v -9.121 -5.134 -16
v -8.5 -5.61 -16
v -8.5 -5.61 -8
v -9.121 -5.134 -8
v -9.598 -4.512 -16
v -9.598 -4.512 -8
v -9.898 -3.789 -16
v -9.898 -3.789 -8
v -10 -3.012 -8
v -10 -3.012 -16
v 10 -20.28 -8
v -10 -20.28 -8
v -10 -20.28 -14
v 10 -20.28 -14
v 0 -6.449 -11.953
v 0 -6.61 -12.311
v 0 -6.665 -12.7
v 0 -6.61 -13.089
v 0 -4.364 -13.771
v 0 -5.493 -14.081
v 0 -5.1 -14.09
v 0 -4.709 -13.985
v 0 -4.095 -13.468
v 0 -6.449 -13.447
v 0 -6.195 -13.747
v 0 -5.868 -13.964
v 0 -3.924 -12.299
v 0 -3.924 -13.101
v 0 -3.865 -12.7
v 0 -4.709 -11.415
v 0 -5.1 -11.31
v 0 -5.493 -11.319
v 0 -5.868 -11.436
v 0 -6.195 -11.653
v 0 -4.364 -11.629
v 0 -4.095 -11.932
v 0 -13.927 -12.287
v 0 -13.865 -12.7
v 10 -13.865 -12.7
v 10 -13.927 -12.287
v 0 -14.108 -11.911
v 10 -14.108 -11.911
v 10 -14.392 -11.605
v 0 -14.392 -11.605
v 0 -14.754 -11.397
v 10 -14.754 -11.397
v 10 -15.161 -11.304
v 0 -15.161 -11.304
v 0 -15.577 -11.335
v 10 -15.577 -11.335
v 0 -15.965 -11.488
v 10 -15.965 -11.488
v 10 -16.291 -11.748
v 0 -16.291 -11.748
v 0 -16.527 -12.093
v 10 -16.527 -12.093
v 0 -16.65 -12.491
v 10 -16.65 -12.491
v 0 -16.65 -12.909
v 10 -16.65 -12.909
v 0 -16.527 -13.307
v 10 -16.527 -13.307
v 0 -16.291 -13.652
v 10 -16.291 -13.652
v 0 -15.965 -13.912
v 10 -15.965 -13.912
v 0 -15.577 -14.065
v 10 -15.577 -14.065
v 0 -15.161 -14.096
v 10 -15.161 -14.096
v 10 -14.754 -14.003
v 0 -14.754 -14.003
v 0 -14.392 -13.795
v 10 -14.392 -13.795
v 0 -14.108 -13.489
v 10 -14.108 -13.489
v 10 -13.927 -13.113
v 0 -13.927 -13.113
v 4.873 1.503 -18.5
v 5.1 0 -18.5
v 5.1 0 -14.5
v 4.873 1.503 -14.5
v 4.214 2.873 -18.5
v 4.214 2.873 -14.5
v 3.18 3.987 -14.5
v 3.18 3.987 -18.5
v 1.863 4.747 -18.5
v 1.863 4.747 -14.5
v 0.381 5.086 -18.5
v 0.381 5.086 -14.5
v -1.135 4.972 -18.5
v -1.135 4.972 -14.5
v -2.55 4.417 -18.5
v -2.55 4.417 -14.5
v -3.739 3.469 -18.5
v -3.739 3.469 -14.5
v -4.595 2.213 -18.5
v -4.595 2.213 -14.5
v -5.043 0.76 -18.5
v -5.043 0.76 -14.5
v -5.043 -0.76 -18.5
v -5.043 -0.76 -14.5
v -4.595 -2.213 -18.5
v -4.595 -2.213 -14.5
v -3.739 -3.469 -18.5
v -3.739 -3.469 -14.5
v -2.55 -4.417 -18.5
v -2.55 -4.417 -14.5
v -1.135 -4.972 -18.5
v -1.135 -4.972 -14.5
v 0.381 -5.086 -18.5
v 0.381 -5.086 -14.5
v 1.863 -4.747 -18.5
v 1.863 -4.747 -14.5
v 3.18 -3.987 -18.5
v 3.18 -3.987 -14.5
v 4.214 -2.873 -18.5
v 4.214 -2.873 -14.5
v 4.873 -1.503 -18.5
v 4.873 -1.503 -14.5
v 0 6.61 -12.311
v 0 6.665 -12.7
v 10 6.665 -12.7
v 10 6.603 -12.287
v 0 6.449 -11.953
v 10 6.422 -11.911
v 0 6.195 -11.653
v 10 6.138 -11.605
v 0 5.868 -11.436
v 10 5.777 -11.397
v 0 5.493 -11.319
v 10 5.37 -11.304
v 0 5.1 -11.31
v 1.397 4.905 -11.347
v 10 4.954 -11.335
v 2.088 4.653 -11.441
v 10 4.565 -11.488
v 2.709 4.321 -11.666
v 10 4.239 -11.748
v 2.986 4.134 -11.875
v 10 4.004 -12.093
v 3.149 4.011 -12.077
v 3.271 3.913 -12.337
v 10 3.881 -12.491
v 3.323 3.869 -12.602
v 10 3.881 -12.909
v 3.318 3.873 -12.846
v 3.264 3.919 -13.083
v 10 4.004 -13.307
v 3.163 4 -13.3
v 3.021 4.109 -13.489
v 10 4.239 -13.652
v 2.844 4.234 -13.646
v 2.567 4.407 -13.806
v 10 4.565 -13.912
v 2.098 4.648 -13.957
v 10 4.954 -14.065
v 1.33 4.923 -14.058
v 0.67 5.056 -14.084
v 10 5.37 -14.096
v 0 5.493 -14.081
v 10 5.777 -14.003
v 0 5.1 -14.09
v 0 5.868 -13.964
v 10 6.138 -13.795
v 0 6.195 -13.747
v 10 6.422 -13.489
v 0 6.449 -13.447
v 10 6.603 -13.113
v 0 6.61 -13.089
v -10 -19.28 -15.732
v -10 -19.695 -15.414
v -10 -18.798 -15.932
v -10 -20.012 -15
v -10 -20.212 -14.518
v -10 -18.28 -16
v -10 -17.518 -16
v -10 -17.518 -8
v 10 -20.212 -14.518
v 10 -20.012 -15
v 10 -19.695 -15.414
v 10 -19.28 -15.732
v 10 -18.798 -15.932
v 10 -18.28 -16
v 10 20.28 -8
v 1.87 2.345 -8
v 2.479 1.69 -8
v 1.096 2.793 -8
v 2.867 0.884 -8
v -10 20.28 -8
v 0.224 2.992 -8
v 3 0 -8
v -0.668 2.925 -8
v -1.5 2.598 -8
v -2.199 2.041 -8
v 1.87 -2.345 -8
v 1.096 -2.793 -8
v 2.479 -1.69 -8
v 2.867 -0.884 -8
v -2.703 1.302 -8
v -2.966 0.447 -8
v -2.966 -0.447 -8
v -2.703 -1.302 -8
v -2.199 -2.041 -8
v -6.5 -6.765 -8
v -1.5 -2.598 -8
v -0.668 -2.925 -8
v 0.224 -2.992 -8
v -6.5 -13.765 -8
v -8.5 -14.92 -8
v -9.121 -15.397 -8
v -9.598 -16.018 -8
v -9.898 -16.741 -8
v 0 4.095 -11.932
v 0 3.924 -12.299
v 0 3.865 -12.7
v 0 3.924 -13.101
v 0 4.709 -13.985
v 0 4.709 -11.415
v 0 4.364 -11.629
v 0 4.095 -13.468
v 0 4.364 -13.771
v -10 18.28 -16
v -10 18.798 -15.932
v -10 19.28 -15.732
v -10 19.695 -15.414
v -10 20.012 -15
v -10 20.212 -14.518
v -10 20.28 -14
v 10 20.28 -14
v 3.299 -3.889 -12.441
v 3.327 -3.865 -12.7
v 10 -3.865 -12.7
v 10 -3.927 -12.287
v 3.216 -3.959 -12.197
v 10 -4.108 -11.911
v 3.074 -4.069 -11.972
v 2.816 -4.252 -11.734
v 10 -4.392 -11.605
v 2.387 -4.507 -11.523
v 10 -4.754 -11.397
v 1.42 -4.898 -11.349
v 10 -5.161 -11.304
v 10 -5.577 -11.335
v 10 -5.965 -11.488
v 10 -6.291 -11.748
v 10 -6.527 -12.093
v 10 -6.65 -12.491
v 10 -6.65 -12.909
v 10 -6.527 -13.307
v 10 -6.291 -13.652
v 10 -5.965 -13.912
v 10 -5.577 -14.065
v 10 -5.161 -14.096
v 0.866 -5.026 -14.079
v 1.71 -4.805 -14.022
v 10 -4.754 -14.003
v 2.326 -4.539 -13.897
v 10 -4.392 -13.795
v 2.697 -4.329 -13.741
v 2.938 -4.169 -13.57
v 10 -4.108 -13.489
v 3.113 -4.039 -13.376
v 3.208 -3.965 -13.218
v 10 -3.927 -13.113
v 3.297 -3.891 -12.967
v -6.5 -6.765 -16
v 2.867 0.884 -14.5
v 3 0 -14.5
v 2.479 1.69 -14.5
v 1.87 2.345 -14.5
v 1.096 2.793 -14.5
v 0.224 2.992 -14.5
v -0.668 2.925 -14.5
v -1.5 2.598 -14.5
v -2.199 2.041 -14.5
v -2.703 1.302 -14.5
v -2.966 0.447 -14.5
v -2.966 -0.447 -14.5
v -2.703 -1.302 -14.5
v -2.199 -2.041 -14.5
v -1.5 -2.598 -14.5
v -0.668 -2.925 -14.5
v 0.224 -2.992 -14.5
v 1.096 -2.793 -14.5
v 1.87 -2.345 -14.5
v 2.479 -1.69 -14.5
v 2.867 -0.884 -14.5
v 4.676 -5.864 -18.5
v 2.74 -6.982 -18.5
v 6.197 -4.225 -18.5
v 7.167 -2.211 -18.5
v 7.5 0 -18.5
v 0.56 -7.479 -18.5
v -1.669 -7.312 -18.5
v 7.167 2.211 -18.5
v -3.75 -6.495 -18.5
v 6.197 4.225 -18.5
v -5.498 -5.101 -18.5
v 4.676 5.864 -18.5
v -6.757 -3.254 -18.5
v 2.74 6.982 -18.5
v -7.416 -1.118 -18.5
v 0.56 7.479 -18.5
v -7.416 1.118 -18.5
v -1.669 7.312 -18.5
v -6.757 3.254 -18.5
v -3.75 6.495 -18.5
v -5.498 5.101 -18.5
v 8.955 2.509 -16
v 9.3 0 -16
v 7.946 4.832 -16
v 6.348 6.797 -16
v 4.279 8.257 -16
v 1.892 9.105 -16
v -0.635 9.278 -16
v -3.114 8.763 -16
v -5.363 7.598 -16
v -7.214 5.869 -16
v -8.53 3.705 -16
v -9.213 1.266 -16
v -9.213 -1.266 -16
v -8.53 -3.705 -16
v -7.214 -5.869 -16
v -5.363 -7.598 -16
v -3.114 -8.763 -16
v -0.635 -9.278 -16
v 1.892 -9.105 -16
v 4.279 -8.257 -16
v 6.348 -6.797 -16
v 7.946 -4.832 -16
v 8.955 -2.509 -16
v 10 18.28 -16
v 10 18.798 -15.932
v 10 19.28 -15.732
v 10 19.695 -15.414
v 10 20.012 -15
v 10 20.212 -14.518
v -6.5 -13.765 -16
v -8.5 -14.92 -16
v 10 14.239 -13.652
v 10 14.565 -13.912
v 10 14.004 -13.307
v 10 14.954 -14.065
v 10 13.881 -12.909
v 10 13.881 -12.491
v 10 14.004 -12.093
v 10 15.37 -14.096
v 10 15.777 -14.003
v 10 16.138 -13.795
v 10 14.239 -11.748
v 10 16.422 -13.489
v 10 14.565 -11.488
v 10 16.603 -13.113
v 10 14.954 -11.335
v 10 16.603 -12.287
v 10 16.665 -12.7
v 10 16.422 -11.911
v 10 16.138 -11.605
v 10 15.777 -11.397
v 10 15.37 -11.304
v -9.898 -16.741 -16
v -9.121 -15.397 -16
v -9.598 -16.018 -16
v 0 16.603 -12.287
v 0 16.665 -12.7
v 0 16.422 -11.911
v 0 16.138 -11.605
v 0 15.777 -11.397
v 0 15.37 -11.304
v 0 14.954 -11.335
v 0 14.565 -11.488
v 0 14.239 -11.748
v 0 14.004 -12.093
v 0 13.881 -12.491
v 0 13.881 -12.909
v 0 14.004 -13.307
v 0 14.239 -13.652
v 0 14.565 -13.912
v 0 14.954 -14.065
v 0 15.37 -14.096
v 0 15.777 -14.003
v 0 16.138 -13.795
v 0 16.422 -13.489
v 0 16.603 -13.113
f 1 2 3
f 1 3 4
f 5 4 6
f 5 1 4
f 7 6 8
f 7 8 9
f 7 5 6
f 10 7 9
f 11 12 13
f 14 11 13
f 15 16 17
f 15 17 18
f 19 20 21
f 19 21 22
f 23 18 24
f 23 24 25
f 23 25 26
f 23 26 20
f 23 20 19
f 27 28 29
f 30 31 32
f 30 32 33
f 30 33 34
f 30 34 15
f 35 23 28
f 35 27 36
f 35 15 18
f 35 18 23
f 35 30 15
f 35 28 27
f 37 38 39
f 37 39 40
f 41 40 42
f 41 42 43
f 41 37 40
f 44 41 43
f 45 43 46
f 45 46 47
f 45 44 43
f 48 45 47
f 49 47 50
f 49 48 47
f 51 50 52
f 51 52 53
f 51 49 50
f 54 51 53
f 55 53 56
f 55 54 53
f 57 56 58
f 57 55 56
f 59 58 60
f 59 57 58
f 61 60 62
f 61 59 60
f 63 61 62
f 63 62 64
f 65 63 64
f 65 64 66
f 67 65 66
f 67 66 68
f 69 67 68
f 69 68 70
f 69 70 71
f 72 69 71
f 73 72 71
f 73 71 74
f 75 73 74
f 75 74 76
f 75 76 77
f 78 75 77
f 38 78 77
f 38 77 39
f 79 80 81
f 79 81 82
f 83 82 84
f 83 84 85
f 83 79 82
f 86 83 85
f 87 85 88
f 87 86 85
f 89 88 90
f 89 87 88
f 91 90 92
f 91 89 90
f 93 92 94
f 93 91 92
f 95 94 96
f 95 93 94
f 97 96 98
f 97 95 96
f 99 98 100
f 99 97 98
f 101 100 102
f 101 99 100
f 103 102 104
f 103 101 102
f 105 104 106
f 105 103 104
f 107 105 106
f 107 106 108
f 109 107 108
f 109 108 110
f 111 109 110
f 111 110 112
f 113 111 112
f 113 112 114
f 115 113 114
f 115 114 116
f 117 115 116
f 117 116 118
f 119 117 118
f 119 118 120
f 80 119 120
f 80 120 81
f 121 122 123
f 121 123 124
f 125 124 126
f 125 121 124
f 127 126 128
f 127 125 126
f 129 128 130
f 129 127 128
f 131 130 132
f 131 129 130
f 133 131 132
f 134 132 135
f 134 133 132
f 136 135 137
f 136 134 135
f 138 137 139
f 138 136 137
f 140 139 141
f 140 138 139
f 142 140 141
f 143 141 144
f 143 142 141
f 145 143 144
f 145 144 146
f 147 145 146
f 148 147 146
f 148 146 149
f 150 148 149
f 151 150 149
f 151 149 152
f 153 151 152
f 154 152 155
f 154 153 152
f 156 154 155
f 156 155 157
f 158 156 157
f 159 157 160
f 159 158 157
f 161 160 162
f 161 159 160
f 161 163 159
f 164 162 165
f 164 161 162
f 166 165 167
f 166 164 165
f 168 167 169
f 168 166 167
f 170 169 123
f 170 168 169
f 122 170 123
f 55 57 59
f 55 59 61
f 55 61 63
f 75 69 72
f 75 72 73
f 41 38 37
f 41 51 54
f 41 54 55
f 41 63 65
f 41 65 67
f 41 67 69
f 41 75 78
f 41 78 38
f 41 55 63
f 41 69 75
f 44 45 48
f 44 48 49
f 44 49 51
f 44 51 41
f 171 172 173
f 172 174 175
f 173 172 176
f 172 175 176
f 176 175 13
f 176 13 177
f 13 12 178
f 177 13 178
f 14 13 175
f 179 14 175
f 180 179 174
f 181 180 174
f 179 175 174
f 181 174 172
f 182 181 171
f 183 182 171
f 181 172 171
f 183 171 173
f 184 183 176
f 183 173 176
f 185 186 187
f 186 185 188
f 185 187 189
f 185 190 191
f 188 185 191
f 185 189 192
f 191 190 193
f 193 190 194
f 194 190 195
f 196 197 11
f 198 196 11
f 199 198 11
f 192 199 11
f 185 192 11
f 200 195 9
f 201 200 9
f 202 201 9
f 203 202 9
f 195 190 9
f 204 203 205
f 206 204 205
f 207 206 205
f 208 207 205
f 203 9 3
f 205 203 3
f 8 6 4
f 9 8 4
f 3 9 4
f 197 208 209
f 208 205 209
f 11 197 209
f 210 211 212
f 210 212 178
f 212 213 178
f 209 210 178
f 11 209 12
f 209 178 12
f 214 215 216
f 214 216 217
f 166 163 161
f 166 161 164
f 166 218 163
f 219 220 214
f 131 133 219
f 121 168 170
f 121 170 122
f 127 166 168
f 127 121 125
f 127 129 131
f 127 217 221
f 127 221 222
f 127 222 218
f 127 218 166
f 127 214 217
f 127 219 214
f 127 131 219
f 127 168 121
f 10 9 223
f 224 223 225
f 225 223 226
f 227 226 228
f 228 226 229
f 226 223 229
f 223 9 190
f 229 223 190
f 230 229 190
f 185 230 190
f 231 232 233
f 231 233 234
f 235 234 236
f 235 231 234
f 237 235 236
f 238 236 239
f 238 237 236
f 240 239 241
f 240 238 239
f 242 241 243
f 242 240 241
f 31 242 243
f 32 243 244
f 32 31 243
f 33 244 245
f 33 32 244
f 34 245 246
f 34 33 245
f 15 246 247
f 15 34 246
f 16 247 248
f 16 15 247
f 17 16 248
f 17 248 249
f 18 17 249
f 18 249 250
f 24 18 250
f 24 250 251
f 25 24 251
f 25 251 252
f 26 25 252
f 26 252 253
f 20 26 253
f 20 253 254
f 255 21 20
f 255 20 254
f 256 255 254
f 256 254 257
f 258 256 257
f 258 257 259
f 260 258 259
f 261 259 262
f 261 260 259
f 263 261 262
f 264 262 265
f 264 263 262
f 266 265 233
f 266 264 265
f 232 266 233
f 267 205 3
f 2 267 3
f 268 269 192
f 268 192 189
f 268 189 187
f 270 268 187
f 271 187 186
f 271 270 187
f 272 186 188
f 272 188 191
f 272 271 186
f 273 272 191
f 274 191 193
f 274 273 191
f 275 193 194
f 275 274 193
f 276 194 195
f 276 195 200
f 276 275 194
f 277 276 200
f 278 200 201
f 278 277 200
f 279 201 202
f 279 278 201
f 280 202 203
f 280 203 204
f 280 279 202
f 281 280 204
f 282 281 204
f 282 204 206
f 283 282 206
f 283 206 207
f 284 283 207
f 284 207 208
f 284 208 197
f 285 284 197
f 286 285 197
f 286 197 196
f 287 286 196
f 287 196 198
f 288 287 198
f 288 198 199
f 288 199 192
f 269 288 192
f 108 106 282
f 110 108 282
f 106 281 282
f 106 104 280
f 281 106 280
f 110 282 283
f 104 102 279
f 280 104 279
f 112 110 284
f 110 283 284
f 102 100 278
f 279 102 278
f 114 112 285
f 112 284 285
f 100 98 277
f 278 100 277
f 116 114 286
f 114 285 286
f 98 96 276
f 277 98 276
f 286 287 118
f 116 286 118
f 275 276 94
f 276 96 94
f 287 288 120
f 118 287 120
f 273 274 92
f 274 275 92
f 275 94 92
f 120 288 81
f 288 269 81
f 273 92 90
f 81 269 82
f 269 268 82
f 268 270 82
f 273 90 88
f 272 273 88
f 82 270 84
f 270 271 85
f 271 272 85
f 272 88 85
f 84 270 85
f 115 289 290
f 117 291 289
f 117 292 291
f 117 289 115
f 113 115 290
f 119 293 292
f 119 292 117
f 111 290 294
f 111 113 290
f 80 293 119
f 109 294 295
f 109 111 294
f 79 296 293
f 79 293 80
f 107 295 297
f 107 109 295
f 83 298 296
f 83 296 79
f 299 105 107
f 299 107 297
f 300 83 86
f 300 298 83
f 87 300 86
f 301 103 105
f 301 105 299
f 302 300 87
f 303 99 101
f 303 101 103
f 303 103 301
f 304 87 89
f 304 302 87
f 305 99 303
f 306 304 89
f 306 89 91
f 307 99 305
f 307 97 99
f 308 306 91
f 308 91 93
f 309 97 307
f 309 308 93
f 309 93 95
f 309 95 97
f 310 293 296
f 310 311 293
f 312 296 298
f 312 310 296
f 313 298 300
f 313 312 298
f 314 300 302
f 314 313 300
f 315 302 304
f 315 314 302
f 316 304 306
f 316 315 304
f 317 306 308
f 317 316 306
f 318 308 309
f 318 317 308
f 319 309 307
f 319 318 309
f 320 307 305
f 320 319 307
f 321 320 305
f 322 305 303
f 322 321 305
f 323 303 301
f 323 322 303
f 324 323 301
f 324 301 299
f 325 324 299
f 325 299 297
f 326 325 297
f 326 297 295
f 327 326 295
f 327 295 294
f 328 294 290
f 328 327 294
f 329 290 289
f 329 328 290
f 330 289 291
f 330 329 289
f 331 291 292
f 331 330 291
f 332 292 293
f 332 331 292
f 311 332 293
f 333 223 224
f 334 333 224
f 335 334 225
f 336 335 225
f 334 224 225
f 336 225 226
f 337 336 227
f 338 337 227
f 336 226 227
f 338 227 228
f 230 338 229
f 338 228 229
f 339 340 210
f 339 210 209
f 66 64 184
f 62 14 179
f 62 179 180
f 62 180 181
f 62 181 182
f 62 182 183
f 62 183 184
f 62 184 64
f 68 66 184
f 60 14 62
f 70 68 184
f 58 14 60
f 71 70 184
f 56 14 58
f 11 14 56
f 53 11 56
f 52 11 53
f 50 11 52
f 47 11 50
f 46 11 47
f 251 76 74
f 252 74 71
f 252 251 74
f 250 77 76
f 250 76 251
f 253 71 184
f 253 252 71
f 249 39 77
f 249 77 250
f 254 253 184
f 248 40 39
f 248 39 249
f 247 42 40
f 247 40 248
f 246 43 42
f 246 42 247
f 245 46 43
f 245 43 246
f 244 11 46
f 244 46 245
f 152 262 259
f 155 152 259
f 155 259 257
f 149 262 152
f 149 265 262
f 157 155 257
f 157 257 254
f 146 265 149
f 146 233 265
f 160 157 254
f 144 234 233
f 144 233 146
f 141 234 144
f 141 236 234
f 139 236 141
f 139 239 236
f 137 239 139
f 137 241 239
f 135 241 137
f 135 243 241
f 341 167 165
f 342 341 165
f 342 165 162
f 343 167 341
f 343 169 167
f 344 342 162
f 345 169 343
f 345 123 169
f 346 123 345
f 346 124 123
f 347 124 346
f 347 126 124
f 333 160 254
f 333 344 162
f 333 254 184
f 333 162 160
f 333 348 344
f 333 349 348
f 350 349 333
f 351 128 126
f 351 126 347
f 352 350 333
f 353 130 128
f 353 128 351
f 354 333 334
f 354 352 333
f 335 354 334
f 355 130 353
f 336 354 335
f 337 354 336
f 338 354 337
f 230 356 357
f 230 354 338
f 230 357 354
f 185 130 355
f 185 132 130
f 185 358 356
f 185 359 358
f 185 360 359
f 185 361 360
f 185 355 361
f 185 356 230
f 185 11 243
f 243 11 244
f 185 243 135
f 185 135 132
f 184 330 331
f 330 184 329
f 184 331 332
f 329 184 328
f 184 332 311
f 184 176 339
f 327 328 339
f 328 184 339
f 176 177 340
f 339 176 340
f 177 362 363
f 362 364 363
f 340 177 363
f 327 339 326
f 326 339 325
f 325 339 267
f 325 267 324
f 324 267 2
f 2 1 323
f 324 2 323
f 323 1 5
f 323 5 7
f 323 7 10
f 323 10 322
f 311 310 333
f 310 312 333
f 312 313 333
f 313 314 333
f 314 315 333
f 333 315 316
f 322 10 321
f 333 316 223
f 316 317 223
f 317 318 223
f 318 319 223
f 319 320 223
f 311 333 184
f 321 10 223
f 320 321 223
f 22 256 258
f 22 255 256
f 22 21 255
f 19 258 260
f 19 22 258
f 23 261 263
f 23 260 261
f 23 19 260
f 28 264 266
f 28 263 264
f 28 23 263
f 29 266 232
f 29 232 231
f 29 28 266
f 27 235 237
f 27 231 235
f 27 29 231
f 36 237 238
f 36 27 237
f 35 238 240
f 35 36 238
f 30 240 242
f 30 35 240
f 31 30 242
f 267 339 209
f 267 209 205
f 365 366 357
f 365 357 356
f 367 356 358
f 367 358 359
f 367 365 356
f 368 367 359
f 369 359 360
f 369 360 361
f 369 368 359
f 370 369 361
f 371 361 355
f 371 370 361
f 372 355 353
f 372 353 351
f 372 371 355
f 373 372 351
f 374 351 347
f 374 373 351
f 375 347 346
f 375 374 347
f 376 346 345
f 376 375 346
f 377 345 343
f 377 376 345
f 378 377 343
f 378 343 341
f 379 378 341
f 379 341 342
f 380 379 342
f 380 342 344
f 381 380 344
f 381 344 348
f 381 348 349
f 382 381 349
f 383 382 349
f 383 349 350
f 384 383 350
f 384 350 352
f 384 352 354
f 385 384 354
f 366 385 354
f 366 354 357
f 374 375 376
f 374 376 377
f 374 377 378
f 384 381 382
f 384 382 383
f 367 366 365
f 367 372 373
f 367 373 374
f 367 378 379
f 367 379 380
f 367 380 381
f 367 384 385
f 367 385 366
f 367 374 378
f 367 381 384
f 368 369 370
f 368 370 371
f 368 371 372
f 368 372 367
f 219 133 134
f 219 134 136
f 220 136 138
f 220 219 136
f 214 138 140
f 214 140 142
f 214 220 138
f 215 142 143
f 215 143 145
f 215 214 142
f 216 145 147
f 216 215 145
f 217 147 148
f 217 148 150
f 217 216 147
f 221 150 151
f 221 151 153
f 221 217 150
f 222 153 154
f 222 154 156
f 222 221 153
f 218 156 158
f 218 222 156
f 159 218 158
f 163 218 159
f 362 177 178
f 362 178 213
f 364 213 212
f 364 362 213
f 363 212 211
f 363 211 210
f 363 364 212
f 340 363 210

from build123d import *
from OCP.BRepFilletAPI import BRepFilletAPI_MakeChamfer

# Parameters (mm, degrees)
SKETCH1_W                     = 20
SKETCH1_H                     = 40.56076
BOSS_EXTRUDE1_DEPTH           = 8
SKETCH6_R                     = 1.4
CUT_EXTRUDE1_DEPTH            = 10
SKETCH8_R                     = 7.5
BOSS_EXTRUDE2_DEPTH           = 2.5
SKETCH9_R                     = 5.1
CUT_EXTRUDE3_DEPTH            = 4
SKETCH10_R                    = 3
CUT_EXTRUDE4_DEPTH            = 6.5
FILLET1_R                     = 2
CHAMFER1_SIZE2                = 2.5
CHAMFER1_SIZE                 = 1.8
SKETCH11_W                    = 8
SKETCH11_H                    = 7
CUT_EXTRUDE5_DEPTH            = 3.5
CHAMFER2_SIZE                 = 2.020725942
CHAMFER2_SIZE_2               = 3.5
FILLET2_R                     = 3
BODY_MOVE_COPY1_OUTLINE_W     = 2.1
BODY_MOVE_COPY1_OUTLINE_H     = 6.5
BODY_MOVE_COPY1_START         = -10
BODY_MOVE_COPY1_2_DEPTH       = 20
BODY_MOVE_COPY1_3_OUTLINE_R   = 1.4
BODY_MOVE_COPY1_3_DEPTH       = 4.176980959
BODY_MOVE_COPY1_4_OUTLINE_R   = 1.4
BODY_MOVE_COPY1_4_DEPTH       = 20
BODY_MOVE_COPY1_5_OUTLINE_R   = 1.4
BODY_MOVE_COPY1_5_DEPTH       = 10
BODY_MOVE_COPY1_6_OUTLINE_R   = 5.1
BODY_MOVE_COPY1_6_DEPTH       = 2.5
BODY_MOVE_COPY1_START_2       = -16
BODY_MOVE_COPY1_7_OUTLINE_R   = 3
BODY_MOVE_COPY1_7_DEPTH       = 8
BODY_MOVE_COPY1_8_OUTLINE_R   = 5.1
BODY_MOVE_COPY1_8_OUTLINE_R_2 = 3
BODY_MOVE_COPY1_8_DEPTH       = 1.5


with BuildPart() as part:
    # Sketch1 → Boss-Extrude1 (new body)
    with BuildSketch(Plane.XY):
        Rectangle(SKETCH1_W, SKETCH1_H)
    extrude(amount=-BOSS_EXTRUDE1_DEPTH)

    # Sketch6 → Cut-Extrude1 (cut)
    with BuildSketch(Plane(origin=(10, 0, 0), x_dir=(0, 0, -1), z_dir=(1, 0, 0))):
        with Locations(Location((3.3, -15.26519, 0), (0, 0, 180))):
            Circle(SKETCH6_R)
        with Locations((3.3, -5.26519)):
            Circle(SKETCH6_R)
        with Locations((3.3, 15.26519)):
            Circle(SKETCH6_R)
        with Locations(Location((3.3, 5.26519, 0), (0, 0, 180))):
            Circle(SKETCH6_R)
    extrude(amount=-CUT_EXTRUDE1_DEPTH, mode=Mode.SUBTRACT)

    # Sketch8 → Boss-Extrude2 (add)
    with BuildSketch(Plane.XY):
        Circle(SKETCH8_R)
    extrude(amount=BOSS_EXTRUDE2_DEPTH)

    # Sketch9 → Cut-Extrude3 (cut)
    with BuildSketch(Plane.XY.offset(2.5)):
        Circle(SKETCH9_R)
    extrude(amount=-CUT_EXTRUDE3_DEPTH, mode=Mode.SUBTRACT)

    # Sketch10 → Cut-Extrude4 (cut)
    with BuildSketch(Plane.XY.offset(-1.5)):
        Circle(SKETCH10_R)
    extrude(amount=-CUT_EXTRUDE4_DEPTH, mode=Mode.SUBTRACT)

    # Fillet1
    fillet1_edges = [part.edges().sort_by_distance(p)[0] for p in [
        (0, -20.28038, 0),
        (0, 20.28038, 0),
    ]]
    fillet(fillet1_edges, radius=FILLET1_R)

    # Chamfer1
    chamfer1_edges = [part.edges().sort_by_distance(p)[0] for p in [
        (-7.5, 0, 0),
    ]]
    chamfer1_side = [part.faces().sort_by_distance(p)[0] for p in [
        (-7.536, 0, 0),
    ]]
    chamfer(chamfer1_edges, length=CHAMFER1_SIZE - 0.0001, length2=CHAMFER1_SIZE2 - 0.0001, reference=chamfer1_side[0])  # a hair under: the kernel refuses the full size

    # Sketch11 → Cut-Extrude5 (cut)
    with BuildSketch(Plane.ZY.offset(10)):
        with Locations((-4, -10.26517)):
            Rectangle(SKETCH11_W, SKETCH11_H)
    extrude(amount=-CUT_EXTRUDE5_DEPTH, mode=Mode.SUBTRACT)

    # Chamfer2
    chamfer2_edges_1 = [part.edges().sort_by_distance(p)[0] for p in [
        (-10, -13.76517, -4),
    ]]
    chamfer2_side_1 = [part.faces().sort_by_distance(p)[0] for p in [
        (-10, -13.805584519, -4),
    ]]
    chamfer2_edges_2 = [part.edges().sort_by_distance(p)[0] for p in [
        (-10, -6.76517, -4),
    ]]
    chamfer2_side_2 = [part.faces().sort_by_distance(p)[0] for p in [
        (-9.959585481, -6.76517, -4),
    ]]
    chamfer2 = BRepFilletAPI_MakeChamfer(part.part.solid().wrapped)
    for e in chamfer2_edges_1:
        chamfer2.Add(CHAMFER2_SIZE - 0.0001, CHAMFER2_SIZE_2 - 0.0001, e.wrapped, chamfer2_side_1[0].wrapped)
    for e in chamfer2_edges_2:
        chamfer2.Add(CHAMFER2_SIZE_2 - 0.0001, CHAMFER2_SIZE - 0.0001, e.wrapped, chamfer2_side_2[0].wrapped)
    add(Compound.cast(chamfer2.Shape()), mode=Mode.REPLACE)  # a hair under: the kernel refuses the full size

    # Fillet2
    fillet2_edges = [part.edges().sort_by_distance(p)[0] for p in [
        (-10, -15.785795942, -4),
        (-10, -4.744544058, -4),
    ]]
    fillet(fillet2_edges, radius=FILLET2_R)

    # Body-Move/Copy1: read off the stored shape, not the designer's step
    # Body-Move/Copy1 outline → Body-Move/Copy1 (revolve)
    with BuildSketch(Plane.XZ):
        Polygon((7.5, -18.5), (9.3, -16), (5.1, -16), (5.1, -18.5), align=None)
        with Locations((4.05, -11.25)):
            Rectangle(BODY_MOVE_COPY1_OUTLINE_W, BODY_MOVE_COPY1_OUTLINE_H)
    revolve(axis=Axis((0, 0, 0), (0, 0, 1)))

    # Body-Move_Copy1 2 outline → Body-Move_Copy1 2 (cut)
    with BuildSketch(Plane.YZ.offset(BODY_MOVE_COPY1_START)):
        with BuildLine():
            Line((-20.28038, -8), (20.28038, -8))
            Line((20.28038, -8), (20.28038, -2))
            ThreePointArc((20.28038, -2), (19.694593562, -0.585786438), (18.28038, 0))
            Line((18.28038, 0), (-18.28038, 0))
            ThreePointArc((-18.28038, 0), (-19.694593562, -0.585786438), (-20.28038, -2))
            Line((-20.28038, -2), (-20.28038, -8))
        make_face()
    extrude(amount=BODY_MOVE_COPY1_2_DEPTH, mode=Mode.SUBTRACT)

    # Body-Move_Copy1 3 outline → Body-Move_Copy1 3 (cut)
    with BuildSketch(Plane.YZ):
        with Locations((-5.26519, -12.7)):
            Circle(BODY_MOVE_COPY1_3_OUTLINE_R)
        with Locations((5.26519, -12.7)):
            Circle(BODY_MOVE_COPY1_3_OUTLINE_R)
    extrude(amount=BODY_MOVE_COPY1_3_DEPTH, mode=Mode.SUBTRACT)

    # Body-Move_Copy1 4 outline → Body-Move_Copy1 4 (add)
    with BuildSketch(Plane.YZ.offset(BODY_MOVE_COPY1_START)):
        with BuildLine():
            ThreePointArc((18.28038, -16), (19.694593562, -15.414213562), (20.28038, -14))
            Line((20.28038, -14), (20.28038, -8))
            Line((20.28038, -8), (-20.28038, -8))
            Line((-20.28038, -8), (-20.28038, -14))
            ThreePointArc((-20.28038, -14), (-19.694593562, -15.414213562), (-18.28038, -16))
            Line((-18.28038, -16), (18.28038, -16))
        make_face()
        with Locations((-15.26519, -12.7)):
            Circle(BODY_MOVE_COPY1_4_OUTLINE_R, mode=Mode.SUBTRACT)
        with Locations((-5.26519, -12.7)):
            Circle(BODY_MOVE_COPY1_4_OUTLINE_R, mode=Mode.SUBTRACT)
        with Locations((5.26519, -12.7)):
            Circle(BODY_MOVE_COPY1_4_OUTLINE_R, mode=Mode.SUBTRACT)
        with Locations((15.26519, -12.7)):
            Circle(BODY_MOVE_COPY1_4_OUTLINE_R, mode=Mode.SUBTRACT)
    extrude(amount=BODY_MOVE_COPY1_4_DEPTH)

    # Body-Move_Copy1 5 outline → Body-Move_Copy1 5 (add)
    with BuildSketch(Plane.YZ.offset(BODY_MOVE_COPY1_START)):
        with Locations((-5.26519, -12.7)):
            Circle(BODY_MOVE_COPY1_5_OUTLINE_R)
        with Locations((15.26519, -12.7)):
            Circle(BODY_MOVE_COPY1_5_OUTLINE_R)
        with Locations((5.26519, -12.7)):
            Circle(BODY_MOVE_COPY1_5_OUTLINE_R)
        with Locations((-15.26519, -12.7)):
            Circle(BODY_MOVE_COPY1_5_OUTLINE_R)
    extrude(amount=BODY_MOVE_COPY1_5_DEPTH)

    # Body-Move_Copy1 6 outline → Body-Move_Copy1 6 (cut)
    with BuildSketch(Plane.XY):
        with BuildLine():
            Line((-6.5, -6.76517), (-6.5, -13.76517))
            Line((-6.5, -13.76517), (-8.5, -14.919870538))
            ThreePointArc((-8.5, -14.919870538), (-9.598076211, -16.01794675), (-10, -17.51794675))
            Line((-10, -17.51794675), (-10, -19))
            Line((-10, -19), (11, -19))
            Line((11, -19), (11, 11))
            Line((11, 11), (-10.000000008, 11))
            Line((-10.000000008, 11), (-10, -3.01239325))
            ThreePointArc((-10, -3.01239325), (-9.598076211, -4.51239325), (-8.5, -5.610469462))
            Line((-8.5, -5.610469462), (-6.5, -6.76517))
        make_face()
        Circle(BODY_MOVE_COPY1_6_OUTLINE_R, mode=Mode.SUBTRACT)
    extrude(amount=BODY_MOVE_COPY1_6_DEPTH, mode=Mode.SUBTRACT)

    # Body-Move_Copy1 7 outline → Body-Move_Copy1 7 (cut)
    with BuildSketch(Plane.XY.offset(BODY_MOVE_COPY1_START_2)):
        Circle(BODY_MOVE_COPY1_7_OUTLINE_R)
        with BuildLine():
            Line((-8.5, -14.919870538), (-6.5, -13.76517))
            Line((-6.5, -13.76517), (-6.5, -6.76517))
            Line((-6.5, -6.76517), (-8.5, -5.610469462))
            ThreePointArc((-8.5, -5.610469462), (-9.598076211, -4.51239325), (-10, -3.01239325))
            Line((-10, -3.01239325), (-10, -17.51794675))
            ThreePointArc((-10, -17.51794675), (-9.598076211, -16.01794675), (-8.5, -14.919870538))
        make_face()
    extrude(amount=BODY_MOVE_COPY1_7_DEPTH, mode=Mode.SUBTRACT)

    # Body-Move_Copy1 8 outline → Body-Move_Copy1 8 (cut)
    with BuildSketch(Plane.XY.offset(BODY_MOVE_COPY1_START_2)):
        Circle(BODY_MOVE_COPY1_8_OUTLINE_R)
        Circle(BODY_MOVE_COPY1_8_OUTLINE_R_2, mode=Mode.SUBTRACT)
    extrude(amount=BODY_MOVE_COPY1_8_DEPTH, mode=Mode.SUBTRACT)


solid = part.part
